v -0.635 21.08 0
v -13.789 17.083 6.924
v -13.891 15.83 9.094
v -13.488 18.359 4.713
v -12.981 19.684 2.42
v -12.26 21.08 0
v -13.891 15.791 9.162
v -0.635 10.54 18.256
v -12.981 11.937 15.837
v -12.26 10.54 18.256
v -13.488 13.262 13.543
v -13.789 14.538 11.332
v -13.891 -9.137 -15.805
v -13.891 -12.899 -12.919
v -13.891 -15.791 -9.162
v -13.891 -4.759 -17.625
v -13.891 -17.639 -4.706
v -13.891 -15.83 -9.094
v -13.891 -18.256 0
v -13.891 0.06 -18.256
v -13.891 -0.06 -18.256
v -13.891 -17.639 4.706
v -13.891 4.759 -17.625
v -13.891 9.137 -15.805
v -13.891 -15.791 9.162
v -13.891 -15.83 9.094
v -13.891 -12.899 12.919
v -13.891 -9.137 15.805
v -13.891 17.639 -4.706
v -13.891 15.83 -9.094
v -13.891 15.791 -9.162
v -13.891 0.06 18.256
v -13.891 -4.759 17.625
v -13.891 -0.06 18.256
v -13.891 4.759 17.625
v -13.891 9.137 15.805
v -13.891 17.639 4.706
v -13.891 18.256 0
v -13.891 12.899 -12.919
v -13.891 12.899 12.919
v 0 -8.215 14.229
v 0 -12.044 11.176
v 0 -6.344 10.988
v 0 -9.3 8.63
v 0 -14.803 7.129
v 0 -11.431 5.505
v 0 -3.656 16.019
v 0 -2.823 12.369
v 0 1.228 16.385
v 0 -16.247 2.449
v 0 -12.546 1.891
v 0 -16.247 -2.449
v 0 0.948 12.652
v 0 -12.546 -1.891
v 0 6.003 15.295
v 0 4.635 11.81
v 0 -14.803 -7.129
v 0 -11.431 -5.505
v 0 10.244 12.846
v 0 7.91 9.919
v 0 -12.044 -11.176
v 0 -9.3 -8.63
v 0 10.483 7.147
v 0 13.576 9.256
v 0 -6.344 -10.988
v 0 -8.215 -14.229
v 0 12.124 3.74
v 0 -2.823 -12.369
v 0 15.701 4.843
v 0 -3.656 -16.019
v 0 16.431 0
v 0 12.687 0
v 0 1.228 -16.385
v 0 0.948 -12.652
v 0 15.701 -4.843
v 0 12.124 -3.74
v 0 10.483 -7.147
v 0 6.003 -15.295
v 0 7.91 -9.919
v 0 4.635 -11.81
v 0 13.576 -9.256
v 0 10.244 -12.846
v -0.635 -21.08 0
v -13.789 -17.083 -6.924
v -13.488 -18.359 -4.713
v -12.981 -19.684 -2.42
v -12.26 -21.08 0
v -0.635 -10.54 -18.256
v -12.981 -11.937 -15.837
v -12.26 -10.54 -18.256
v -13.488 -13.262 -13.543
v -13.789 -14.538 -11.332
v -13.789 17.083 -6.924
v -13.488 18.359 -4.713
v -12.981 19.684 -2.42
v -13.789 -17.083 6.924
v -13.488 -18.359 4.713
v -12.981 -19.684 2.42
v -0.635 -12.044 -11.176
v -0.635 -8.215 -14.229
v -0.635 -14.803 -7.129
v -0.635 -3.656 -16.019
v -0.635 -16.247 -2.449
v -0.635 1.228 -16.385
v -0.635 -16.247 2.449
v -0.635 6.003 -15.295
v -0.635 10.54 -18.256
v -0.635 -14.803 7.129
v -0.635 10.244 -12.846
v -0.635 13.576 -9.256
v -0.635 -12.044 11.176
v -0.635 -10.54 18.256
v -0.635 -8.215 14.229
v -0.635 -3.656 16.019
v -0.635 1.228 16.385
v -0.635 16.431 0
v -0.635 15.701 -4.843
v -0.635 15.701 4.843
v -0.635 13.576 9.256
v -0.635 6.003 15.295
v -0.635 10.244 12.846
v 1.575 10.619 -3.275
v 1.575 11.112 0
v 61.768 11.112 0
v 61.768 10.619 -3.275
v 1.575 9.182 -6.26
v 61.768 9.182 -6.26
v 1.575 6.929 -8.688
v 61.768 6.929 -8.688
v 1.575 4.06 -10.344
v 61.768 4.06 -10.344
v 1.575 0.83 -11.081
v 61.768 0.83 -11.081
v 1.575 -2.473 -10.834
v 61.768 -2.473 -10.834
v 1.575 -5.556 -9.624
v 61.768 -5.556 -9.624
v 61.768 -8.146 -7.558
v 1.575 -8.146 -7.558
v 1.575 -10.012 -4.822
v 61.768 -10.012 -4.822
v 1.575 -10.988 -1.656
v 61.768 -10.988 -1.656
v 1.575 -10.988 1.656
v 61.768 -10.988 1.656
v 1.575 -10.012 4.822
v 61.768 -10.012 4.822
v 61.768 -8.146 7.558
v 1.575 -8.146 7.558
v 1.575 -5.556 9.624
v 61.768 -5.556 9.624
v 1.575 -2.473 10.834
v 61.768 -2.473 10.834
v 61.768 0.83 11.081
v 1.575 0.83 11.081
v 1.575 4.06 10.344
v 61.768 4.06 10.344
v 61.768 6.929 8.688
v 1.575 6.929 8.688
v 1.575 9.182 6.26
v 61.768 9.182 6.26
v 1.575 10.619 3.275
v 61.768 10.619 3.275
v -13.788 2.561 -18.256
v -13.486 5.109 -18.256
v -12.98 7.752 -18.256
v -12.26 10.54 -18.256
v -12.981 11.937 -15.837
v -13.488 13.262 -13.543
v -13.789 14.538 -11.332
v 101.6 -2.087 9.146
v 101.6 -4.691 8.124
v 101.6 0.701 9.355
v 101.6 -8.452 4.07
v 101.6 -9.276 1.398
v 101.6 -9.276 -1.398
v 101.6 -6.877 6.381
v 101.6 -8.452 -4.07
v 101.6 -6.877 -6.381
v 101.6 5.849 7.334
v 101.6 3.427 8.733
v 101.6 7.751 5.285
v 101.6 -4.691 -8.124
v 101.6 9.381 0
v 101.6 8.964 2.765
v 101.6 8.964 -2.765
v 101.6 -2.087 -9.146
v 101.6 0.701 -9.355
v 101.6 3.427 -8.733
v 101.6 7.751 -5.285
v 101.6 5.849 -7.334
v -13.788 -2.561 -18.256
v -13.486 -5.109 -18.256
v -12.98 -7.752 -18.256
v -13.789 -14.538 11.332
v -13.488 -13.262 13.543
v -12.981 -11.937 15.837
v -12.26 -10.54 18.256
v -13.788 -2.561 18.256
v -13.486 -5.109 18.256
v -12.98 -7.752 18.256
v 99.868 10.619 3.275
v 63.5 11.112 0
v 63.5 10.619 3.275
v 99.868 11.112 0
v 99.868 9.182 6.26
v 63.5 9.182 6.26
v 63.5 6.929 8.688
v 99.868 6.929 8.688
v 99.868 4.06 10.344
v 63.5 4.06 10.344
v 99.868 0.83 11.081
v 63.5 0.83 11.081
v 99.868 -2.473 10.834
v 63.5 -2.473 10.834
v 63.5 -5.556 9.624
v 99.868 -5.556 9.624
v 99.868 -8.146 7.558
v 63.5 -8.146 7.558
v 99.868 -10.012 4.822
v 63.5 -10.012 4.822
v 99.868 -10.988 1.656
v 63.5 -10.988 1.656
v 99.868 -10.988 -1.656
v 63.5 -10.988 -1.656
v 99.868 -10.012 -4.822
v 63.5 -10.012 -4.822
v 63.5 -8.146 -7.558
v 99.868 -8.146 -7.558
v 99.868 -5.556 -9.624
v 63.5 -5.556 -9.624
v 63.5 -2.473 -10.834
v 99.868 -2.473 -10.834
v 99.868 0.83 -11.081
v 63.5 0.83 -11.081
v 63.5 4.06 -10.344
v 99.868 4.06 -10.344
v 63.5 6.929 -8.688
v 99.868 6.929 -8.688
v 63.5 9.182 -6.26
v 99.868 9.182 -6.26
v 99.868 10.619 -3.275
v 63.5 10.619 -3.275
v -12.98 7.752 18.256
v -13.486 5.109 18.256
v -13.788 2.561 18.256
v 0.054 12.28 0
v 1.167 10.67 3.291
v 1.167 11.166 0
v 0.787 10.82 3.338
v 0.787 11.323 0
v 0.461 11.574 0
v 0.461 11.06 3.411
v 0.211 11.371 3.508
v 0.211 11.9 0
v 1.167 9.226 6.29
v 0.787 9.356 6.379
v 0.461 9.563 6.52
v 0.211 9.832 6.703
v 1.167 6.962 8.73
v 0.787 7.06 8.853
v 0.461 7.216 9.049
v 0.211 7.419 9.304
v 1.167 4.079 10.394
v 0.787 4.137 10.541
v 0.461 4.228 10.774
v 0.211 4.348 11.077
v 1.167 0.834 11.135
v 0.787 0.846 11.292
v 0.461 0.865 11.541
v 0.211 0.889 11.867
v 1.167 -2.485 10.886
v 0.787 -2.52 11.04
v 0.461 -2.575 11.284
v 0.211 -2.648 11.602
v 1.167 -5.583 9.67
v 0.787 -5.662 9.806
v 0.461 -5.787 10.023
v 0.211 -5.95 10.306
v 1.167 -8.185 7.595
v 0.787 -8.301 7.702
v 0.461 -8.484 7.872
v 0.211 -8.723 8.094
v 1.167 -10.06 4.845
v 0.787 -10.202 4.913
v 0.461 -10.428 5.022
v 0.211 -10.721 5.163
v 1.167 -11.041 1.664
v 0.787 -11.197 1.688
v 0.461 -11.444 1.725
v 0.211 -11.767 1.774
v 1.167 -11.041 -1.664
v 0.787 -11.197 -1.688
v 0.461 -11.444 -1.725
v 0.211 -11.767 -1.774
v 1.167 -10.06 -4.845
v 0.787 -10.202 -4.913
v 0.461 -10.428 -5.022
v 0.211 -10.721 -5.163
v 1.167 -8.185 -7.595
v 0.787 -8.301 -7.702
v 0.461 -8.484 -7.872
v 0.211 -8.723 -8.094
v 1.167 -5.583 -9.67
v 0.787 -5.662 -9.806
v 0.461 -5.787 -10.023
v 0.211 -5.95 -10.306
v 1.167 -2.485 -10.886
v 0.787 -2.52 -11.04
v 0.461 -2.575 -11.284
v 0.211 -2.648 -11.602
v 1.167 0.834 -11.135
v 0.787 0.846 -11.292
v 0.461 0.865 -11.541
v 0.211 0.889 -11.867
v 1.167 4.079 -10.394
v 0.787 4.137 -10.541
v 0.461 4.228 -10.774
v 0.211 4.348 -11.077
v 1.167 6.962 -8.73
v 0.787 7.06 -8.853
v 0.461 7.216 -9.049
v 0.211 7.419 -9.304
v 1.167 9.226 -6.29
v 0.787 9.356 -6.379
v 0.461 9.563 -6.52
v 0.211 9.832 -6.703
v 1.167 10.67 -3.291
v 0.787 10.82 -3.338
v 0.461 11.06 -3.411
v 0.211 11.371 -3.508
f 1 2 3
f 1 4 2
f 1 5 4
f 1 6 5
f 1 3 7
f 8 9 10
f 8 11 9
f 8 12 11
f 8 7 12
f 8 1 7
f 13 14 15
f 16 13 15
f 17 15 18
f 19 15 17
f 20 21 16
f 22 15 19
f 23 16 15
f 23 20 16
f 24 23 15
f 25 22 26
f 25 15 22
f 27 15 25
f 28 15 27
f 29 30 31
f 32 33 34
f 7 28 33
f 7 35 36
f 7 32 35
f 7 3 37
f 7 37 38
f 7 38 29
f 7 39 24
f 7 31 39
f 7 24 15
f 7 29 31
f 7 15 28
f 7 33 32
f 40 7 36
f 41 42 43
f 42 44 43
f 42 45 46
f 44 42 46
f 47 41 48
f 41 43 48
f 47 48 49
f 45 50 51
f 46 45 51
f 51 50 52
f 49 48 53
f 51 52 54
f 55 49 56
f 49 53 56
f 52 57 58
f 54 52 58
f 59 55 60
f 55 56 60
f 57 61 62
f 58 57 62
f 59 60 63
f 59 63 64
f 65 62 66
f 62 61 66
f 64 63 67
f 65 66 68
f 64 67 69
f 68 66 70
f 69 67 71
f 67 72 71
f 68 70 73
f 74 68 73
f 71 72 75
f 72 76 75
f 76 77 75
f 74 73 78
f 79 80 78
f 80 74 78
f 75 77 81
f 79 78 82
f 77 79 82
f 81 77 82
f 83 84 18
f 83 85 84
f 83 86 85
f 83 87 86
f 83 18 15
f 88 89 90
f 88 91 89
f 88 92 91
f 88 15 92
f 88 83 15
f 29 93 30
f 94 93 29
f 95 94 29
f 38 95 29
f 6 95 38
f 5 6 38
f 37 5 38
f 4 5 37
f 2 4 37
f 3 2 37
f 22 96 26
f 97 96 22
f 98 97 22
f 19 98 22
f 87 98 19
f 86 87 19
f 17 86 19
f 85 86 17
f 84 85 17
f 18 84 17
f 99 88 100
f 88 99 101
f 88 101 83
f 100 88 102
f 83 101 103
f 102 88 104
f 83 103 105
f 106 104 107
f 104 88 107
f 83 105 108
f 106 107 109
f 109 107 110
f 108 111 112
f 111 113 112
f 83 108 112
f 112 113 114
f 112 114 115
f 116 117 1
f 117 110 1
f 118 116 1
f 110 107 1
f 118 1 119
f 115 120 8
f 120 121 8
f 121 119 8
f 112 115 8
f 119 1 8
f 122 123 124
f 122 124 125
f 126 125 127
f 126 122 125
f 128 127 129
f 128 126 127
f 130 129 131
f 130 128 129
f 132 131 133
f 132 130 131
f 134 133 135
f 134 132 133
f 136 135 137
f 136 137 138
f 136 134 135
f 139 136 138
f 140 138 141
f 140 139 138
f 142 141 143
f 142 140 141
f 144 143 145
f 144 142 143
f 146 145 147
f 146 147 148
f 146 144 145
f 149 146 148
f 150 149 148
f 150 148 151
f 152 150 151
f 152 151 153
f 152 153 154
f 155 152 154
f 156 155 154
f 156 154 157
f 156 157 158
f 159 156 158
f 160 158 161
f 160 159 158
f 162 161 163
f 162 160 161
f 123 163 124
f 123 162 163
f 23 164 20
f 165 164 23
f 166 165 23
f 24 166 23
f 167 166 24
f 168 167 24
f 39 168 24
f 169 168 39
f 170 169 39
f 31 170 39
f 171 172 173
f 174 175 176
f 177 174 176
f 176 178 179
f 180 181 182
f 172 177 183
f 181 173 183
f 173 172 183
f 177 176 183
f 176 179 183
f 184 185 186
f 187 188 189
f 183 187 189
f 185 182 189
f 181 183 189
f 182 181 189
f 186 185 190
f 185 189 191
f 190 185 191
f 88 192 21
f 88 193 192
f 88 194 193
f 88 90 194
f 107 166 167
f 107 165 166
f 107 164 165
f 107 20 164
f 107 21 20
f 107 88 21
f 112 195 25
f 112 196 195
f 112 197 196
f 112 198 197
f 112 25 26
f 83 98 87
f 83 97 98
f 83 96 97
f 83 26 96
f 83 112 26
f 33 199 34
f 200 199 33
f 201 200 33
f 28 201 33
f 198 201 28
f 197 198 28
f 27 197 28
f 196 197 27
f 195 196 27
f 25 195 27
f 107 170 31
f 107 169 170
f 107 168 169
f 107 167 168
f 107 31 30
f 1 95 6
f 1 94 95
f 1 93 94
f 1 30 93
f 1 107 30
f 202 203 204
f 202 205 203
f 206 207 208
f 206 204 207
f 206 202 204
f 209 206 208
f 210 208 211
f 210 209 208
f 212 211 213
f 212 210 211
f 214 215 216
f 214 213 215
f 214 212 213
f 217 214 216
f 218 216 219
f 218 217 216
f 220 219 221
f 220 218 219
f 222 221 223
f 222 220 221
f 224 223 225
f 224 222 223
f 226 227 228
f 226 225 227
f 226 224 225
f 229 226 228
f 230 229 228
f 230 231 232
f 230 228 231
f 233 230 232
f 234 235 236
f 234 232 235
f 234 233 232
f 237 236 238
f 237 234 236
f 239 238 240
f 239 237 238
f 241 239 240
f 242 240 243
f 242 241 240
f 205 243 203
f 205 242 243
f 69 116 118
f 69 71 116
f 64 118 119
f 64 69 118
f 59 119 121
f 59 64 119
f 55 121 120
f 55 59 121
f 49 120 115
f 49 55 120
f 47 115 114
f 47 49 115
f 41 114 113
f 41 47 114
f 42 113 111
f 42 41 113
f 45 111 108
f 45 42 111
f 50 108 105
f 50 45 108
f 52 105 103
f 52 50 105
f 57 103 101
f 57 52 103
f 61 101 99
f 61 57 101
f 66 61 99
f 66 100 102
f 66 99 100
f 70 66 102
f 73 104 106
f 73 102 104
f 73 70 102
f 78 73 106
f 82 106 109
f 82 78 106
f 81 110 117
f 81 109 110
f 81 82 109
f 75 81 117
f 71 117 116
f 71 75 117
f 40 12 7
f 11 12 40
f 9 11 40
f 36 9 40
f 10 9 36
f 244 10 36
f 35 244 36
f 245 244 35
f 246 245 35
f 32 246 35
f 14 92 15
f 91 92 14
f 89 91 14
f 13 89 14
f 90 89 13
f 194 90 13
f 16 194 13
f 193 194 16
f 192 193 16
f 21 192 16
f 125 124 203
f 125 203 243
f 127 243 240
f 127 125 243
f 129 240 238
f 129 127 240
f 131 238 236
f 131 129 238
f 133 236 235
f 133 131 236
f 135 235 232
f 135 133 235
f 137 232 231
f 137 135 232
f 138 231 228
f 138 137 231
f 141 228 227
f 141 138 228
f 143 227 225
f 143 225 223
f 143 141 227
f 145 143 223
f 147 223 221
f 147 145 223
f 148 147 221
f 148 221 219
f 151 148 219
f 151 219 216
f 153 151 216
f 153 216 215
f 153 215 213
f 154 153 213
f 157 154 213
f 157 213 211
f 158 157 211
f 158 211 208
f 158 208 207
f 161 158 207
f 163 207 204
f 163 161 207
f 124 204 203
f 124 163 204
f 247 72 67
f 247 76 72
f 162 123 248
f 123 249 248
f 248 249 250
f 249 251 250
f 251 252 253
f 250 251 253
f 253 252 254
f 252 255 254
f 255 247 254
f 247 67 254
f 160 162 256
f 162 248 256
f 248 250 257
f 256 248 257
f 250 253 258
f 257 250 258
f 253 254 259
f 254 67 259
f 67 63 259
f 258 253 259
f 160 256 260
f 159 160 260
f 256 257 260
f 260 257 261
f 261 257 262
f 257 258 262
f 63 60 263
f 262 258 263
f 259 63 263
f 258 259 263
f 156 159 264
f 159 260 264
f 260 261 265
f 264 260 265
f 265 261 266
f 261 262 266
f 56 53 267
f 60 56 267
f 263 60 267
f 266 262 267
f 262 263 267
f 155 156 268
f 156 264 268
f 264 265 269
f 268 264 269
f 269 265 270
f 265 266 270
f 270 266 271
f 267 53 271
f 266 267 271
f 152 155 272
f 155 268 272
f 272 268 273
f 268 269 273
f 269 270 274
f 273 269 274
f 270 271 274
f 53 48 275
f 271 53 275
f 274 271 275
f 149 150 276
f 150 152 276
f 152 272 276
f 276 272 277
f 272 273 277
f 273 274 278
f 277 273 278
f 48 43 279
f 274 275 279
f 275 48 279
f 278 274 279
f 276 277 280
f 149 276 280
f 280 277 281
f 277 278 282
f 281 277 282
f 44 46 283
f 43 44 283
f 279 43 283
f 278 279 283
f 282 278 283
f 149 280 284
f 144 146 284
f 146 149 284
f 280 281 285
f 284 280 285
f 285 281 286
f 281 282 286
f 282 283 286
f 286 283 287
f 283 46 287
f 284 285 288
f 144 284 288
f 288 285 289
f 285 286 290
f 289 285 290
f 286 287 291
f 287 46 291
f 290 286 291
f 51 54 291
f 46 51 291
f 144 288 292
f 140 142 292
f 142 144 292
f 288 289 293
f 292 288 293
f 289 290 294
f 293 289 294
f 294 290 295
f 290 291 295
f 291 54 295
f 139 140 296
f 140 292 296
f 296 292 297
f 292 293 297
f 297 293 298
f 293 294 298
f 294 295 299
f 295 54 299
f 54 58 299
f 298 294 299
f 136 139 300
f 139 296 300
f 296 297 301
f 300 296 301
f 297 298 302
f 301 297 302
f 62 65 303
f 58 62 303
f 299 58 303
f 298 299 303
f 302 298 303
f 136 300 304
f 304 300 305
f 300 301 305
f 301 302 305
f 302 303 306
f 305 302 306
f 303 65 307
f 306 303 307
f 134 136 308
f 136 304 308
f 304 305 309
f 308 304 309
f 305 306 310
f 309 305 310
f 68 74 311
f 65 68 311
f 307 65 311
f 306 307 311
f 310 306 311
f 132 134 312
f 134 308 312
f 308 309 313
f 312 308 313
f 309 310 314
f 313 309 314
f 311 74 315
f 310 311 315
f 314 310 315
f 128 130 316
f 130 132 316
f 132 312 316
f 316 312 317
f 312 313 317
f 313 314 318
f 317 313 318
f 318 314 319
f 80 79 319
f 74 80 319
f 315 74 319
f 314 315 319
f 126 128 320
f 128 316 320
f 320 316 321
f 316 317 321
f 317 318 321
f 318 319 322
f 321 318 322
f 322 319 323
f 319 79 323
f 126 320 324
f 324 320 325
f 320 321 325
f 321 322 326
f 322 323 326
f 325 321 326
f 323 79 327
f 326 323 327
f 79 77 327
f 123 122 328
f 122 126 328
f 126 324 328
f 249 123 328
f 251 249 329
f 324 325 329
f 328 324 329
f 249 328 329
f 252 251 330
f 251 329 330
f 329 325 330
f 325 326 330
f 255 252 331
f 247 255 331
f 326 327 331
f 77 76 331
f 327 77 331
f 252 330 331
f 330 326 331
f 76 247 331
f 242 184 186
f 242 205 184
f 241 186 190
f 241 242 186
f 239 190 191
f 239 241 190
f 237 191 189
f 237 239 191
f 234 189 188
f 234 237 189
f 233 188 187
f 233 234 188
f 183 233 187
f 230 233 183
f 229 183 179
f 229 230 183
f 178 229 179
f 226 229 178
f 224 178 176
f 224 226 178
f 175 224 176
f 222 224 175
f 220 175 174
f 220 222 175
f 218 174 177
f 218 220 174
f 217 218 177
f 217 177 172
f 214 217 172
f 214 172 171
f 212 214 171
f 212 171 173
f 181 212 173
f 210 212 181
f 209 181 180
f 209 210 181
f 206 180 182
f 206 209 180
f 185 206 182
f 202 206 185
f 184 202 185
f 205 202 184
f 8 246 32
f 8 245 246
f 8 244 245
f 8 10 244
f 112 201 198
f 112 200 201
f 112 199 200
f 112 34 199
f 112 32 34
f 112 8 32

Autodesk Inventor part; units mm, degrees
ref_plane "YZ Plane" through (0, 0, 0) normal (1, 0, 0) x (0, 1, 0)
ref_plane "XZ Plane" through (0, 0, 0) normal (0, 1, 0) x (-1, 0, 0)
sketch "Sketch1" plane through (0, 0, 0) normal (0, 0, 1) x (1, 0, 0)
  line L0 (0, 16.4306) -> (0, 11.1125)
  line L1 (63.5, 11.1125) -> (101.6, 11.1125)
  line L2 (101.6, 11.1125) -> (101.6, 0)
  line L3 (101.6, 0) -> (-0.6351, 0)
  line L4 (-21.0821, 0) -> (122.047, 0) projected
  line L5 (-0.6351, 0) -> (-0.6351, 16.4306)
  line L6 (-0.6351, 16.4306) -> (0, 16.4306)
  line L7 (63.5, 11.1125) -> (61.7685, 11.1125)
  line L8 (61.7685, 11.1125) -> (0, 11.1125)
  line L9 (0, -3.2861) -> (0, 19.7168) projected
  dimension "d0" = 101.6
  dimension "d1" = 38.1
  dimension "d2" = 22.225
  dimension "d9" = 0.6351
  dimension "d10" = 32.8612
  dimension "d13" = 1.7315
  dimension "d14" = 22.225
revolve "Body" add sketch "Sketch1" angle 360 about axis through (101.6, 0, 0) along (-1, 0, 0)
sketch "Sketch2" plane through (-0.6351, 0, 0) normal (-1, 0, 0) x (0, 0, 1)
  line L0 (0, 21.0805) -> (18.2562, 10.5403)
  line L1 (18.2562, 10.5403) -> (18.2562, -10.5403)
  line L2 (18.2562, -10.5403) -> (0, -21.0805)
  line L3 (0, -21.0805) -> (-18.2562, -10.5403)
  line L4 (-18.2562, -10.5403) -> (-18.2562, 10.5403)
  line L5 (-18.2562, 10.5403) -> (0, 21.0805)
  point P0 (0, 0)
  point P1 (0, 0)
  dimension "d11" = 36.5125
extrude "Head" add sketch "Sketch2" along normal blind 13.2556
sketch "Sketch4" plane through (0, 0, 0) normal (0, 0, 1) x (1, 0, 0)
  line L0 (-13.8907, 18.2563) -> (-13.8907, 21.0805)
  line L1 (-13.8907, 21.0805) -> (-12.2601, 21.0805)
  line L2 (-12.2601, 21.0805) -> (-13.8907, 18.2563)
  line L3 (-16.5419, 0) -> (2.016, 0) projected
  line L4 (-0.6351, 21.0805) -> (-13.8907, 21.0805) projected
  line L5 (-13.8907, 10.5403) -> (-13.8907, 21.0805) projected
  dimension "d5" = 30
  dimension "d19" = 36.5125
revolve "Chamfer1" cut sketch "Sketch4" angle 360 about axis through (-10, 0, 0) along (1, 0, 0)
thread "Thread" size "7/8-9 UNC" class "2A" standard "ANSI Unified Screw Threads" length 38.1
chamfer "Chamfer2" distance 1.7314 distance2 1.7315 1 edges at (101.6, -11.1125, 0) measured on face at (101.6, -3.0893, -3.2913)
ref_plane "Work Plane1" through (1.525, 0, 0) normal (0, 0, 1) x (1, 0, 0)
fillet "Fillet2" radius 1.5748 1 edges at (0, -11.1125, 0)
equation "\"d0\" = NLG"
equation "\"d1\" = GEL"
equation "\"d2\" = GD"
equation "\"d10\" = SD2"
equation "\"d14\" = BDM"
equation "\"d11\" = SW"
equation "\"d3\" = KOH - SD"
equation "\"d5\" = ANG1"
equation "\"d19\" = SW0"
equation "\"d63\" = R"
equation "\"d15\" = GEL"
equation "\"d6\" = -0.5 * SPD + 0.5 * GD"
equation "\"NLG\" = 101.6"
equation "\"GD\" = NND"
equation "\"BDM\" = 22.225"
equation "\"KOH\" = 13.89062"
equation "\"GEL\" = 38.1"
equation "\"SW\" = 36.5125"
equation "\"SW0\" = SW"
equation "\"SPD\" = GD1"
equation "\"SD2\" = 0.9 * SW"
equation "\"SD\" = 0.635"
equation "\"ANG1\" = 30deg"
equation "\"GAL\" = GUL"
equation "\"GUL\" = 1.73139"
equation "\"R\" = 1.5748"
equation "\"d62\" = -NLG - SD + GUL"
equation "\"GD1\" = 18.76222"
equation "\"THREADDIA\" = 22.225"
equation "\"TOA\" = 30deg"
equation "\"NND\" = 22.225"
equation "\"E0\" = 1.155 * SW"
properties part number "ANSI B18.2.6 - 7/8-9 UNC - 4" material "Steel, Mild"
